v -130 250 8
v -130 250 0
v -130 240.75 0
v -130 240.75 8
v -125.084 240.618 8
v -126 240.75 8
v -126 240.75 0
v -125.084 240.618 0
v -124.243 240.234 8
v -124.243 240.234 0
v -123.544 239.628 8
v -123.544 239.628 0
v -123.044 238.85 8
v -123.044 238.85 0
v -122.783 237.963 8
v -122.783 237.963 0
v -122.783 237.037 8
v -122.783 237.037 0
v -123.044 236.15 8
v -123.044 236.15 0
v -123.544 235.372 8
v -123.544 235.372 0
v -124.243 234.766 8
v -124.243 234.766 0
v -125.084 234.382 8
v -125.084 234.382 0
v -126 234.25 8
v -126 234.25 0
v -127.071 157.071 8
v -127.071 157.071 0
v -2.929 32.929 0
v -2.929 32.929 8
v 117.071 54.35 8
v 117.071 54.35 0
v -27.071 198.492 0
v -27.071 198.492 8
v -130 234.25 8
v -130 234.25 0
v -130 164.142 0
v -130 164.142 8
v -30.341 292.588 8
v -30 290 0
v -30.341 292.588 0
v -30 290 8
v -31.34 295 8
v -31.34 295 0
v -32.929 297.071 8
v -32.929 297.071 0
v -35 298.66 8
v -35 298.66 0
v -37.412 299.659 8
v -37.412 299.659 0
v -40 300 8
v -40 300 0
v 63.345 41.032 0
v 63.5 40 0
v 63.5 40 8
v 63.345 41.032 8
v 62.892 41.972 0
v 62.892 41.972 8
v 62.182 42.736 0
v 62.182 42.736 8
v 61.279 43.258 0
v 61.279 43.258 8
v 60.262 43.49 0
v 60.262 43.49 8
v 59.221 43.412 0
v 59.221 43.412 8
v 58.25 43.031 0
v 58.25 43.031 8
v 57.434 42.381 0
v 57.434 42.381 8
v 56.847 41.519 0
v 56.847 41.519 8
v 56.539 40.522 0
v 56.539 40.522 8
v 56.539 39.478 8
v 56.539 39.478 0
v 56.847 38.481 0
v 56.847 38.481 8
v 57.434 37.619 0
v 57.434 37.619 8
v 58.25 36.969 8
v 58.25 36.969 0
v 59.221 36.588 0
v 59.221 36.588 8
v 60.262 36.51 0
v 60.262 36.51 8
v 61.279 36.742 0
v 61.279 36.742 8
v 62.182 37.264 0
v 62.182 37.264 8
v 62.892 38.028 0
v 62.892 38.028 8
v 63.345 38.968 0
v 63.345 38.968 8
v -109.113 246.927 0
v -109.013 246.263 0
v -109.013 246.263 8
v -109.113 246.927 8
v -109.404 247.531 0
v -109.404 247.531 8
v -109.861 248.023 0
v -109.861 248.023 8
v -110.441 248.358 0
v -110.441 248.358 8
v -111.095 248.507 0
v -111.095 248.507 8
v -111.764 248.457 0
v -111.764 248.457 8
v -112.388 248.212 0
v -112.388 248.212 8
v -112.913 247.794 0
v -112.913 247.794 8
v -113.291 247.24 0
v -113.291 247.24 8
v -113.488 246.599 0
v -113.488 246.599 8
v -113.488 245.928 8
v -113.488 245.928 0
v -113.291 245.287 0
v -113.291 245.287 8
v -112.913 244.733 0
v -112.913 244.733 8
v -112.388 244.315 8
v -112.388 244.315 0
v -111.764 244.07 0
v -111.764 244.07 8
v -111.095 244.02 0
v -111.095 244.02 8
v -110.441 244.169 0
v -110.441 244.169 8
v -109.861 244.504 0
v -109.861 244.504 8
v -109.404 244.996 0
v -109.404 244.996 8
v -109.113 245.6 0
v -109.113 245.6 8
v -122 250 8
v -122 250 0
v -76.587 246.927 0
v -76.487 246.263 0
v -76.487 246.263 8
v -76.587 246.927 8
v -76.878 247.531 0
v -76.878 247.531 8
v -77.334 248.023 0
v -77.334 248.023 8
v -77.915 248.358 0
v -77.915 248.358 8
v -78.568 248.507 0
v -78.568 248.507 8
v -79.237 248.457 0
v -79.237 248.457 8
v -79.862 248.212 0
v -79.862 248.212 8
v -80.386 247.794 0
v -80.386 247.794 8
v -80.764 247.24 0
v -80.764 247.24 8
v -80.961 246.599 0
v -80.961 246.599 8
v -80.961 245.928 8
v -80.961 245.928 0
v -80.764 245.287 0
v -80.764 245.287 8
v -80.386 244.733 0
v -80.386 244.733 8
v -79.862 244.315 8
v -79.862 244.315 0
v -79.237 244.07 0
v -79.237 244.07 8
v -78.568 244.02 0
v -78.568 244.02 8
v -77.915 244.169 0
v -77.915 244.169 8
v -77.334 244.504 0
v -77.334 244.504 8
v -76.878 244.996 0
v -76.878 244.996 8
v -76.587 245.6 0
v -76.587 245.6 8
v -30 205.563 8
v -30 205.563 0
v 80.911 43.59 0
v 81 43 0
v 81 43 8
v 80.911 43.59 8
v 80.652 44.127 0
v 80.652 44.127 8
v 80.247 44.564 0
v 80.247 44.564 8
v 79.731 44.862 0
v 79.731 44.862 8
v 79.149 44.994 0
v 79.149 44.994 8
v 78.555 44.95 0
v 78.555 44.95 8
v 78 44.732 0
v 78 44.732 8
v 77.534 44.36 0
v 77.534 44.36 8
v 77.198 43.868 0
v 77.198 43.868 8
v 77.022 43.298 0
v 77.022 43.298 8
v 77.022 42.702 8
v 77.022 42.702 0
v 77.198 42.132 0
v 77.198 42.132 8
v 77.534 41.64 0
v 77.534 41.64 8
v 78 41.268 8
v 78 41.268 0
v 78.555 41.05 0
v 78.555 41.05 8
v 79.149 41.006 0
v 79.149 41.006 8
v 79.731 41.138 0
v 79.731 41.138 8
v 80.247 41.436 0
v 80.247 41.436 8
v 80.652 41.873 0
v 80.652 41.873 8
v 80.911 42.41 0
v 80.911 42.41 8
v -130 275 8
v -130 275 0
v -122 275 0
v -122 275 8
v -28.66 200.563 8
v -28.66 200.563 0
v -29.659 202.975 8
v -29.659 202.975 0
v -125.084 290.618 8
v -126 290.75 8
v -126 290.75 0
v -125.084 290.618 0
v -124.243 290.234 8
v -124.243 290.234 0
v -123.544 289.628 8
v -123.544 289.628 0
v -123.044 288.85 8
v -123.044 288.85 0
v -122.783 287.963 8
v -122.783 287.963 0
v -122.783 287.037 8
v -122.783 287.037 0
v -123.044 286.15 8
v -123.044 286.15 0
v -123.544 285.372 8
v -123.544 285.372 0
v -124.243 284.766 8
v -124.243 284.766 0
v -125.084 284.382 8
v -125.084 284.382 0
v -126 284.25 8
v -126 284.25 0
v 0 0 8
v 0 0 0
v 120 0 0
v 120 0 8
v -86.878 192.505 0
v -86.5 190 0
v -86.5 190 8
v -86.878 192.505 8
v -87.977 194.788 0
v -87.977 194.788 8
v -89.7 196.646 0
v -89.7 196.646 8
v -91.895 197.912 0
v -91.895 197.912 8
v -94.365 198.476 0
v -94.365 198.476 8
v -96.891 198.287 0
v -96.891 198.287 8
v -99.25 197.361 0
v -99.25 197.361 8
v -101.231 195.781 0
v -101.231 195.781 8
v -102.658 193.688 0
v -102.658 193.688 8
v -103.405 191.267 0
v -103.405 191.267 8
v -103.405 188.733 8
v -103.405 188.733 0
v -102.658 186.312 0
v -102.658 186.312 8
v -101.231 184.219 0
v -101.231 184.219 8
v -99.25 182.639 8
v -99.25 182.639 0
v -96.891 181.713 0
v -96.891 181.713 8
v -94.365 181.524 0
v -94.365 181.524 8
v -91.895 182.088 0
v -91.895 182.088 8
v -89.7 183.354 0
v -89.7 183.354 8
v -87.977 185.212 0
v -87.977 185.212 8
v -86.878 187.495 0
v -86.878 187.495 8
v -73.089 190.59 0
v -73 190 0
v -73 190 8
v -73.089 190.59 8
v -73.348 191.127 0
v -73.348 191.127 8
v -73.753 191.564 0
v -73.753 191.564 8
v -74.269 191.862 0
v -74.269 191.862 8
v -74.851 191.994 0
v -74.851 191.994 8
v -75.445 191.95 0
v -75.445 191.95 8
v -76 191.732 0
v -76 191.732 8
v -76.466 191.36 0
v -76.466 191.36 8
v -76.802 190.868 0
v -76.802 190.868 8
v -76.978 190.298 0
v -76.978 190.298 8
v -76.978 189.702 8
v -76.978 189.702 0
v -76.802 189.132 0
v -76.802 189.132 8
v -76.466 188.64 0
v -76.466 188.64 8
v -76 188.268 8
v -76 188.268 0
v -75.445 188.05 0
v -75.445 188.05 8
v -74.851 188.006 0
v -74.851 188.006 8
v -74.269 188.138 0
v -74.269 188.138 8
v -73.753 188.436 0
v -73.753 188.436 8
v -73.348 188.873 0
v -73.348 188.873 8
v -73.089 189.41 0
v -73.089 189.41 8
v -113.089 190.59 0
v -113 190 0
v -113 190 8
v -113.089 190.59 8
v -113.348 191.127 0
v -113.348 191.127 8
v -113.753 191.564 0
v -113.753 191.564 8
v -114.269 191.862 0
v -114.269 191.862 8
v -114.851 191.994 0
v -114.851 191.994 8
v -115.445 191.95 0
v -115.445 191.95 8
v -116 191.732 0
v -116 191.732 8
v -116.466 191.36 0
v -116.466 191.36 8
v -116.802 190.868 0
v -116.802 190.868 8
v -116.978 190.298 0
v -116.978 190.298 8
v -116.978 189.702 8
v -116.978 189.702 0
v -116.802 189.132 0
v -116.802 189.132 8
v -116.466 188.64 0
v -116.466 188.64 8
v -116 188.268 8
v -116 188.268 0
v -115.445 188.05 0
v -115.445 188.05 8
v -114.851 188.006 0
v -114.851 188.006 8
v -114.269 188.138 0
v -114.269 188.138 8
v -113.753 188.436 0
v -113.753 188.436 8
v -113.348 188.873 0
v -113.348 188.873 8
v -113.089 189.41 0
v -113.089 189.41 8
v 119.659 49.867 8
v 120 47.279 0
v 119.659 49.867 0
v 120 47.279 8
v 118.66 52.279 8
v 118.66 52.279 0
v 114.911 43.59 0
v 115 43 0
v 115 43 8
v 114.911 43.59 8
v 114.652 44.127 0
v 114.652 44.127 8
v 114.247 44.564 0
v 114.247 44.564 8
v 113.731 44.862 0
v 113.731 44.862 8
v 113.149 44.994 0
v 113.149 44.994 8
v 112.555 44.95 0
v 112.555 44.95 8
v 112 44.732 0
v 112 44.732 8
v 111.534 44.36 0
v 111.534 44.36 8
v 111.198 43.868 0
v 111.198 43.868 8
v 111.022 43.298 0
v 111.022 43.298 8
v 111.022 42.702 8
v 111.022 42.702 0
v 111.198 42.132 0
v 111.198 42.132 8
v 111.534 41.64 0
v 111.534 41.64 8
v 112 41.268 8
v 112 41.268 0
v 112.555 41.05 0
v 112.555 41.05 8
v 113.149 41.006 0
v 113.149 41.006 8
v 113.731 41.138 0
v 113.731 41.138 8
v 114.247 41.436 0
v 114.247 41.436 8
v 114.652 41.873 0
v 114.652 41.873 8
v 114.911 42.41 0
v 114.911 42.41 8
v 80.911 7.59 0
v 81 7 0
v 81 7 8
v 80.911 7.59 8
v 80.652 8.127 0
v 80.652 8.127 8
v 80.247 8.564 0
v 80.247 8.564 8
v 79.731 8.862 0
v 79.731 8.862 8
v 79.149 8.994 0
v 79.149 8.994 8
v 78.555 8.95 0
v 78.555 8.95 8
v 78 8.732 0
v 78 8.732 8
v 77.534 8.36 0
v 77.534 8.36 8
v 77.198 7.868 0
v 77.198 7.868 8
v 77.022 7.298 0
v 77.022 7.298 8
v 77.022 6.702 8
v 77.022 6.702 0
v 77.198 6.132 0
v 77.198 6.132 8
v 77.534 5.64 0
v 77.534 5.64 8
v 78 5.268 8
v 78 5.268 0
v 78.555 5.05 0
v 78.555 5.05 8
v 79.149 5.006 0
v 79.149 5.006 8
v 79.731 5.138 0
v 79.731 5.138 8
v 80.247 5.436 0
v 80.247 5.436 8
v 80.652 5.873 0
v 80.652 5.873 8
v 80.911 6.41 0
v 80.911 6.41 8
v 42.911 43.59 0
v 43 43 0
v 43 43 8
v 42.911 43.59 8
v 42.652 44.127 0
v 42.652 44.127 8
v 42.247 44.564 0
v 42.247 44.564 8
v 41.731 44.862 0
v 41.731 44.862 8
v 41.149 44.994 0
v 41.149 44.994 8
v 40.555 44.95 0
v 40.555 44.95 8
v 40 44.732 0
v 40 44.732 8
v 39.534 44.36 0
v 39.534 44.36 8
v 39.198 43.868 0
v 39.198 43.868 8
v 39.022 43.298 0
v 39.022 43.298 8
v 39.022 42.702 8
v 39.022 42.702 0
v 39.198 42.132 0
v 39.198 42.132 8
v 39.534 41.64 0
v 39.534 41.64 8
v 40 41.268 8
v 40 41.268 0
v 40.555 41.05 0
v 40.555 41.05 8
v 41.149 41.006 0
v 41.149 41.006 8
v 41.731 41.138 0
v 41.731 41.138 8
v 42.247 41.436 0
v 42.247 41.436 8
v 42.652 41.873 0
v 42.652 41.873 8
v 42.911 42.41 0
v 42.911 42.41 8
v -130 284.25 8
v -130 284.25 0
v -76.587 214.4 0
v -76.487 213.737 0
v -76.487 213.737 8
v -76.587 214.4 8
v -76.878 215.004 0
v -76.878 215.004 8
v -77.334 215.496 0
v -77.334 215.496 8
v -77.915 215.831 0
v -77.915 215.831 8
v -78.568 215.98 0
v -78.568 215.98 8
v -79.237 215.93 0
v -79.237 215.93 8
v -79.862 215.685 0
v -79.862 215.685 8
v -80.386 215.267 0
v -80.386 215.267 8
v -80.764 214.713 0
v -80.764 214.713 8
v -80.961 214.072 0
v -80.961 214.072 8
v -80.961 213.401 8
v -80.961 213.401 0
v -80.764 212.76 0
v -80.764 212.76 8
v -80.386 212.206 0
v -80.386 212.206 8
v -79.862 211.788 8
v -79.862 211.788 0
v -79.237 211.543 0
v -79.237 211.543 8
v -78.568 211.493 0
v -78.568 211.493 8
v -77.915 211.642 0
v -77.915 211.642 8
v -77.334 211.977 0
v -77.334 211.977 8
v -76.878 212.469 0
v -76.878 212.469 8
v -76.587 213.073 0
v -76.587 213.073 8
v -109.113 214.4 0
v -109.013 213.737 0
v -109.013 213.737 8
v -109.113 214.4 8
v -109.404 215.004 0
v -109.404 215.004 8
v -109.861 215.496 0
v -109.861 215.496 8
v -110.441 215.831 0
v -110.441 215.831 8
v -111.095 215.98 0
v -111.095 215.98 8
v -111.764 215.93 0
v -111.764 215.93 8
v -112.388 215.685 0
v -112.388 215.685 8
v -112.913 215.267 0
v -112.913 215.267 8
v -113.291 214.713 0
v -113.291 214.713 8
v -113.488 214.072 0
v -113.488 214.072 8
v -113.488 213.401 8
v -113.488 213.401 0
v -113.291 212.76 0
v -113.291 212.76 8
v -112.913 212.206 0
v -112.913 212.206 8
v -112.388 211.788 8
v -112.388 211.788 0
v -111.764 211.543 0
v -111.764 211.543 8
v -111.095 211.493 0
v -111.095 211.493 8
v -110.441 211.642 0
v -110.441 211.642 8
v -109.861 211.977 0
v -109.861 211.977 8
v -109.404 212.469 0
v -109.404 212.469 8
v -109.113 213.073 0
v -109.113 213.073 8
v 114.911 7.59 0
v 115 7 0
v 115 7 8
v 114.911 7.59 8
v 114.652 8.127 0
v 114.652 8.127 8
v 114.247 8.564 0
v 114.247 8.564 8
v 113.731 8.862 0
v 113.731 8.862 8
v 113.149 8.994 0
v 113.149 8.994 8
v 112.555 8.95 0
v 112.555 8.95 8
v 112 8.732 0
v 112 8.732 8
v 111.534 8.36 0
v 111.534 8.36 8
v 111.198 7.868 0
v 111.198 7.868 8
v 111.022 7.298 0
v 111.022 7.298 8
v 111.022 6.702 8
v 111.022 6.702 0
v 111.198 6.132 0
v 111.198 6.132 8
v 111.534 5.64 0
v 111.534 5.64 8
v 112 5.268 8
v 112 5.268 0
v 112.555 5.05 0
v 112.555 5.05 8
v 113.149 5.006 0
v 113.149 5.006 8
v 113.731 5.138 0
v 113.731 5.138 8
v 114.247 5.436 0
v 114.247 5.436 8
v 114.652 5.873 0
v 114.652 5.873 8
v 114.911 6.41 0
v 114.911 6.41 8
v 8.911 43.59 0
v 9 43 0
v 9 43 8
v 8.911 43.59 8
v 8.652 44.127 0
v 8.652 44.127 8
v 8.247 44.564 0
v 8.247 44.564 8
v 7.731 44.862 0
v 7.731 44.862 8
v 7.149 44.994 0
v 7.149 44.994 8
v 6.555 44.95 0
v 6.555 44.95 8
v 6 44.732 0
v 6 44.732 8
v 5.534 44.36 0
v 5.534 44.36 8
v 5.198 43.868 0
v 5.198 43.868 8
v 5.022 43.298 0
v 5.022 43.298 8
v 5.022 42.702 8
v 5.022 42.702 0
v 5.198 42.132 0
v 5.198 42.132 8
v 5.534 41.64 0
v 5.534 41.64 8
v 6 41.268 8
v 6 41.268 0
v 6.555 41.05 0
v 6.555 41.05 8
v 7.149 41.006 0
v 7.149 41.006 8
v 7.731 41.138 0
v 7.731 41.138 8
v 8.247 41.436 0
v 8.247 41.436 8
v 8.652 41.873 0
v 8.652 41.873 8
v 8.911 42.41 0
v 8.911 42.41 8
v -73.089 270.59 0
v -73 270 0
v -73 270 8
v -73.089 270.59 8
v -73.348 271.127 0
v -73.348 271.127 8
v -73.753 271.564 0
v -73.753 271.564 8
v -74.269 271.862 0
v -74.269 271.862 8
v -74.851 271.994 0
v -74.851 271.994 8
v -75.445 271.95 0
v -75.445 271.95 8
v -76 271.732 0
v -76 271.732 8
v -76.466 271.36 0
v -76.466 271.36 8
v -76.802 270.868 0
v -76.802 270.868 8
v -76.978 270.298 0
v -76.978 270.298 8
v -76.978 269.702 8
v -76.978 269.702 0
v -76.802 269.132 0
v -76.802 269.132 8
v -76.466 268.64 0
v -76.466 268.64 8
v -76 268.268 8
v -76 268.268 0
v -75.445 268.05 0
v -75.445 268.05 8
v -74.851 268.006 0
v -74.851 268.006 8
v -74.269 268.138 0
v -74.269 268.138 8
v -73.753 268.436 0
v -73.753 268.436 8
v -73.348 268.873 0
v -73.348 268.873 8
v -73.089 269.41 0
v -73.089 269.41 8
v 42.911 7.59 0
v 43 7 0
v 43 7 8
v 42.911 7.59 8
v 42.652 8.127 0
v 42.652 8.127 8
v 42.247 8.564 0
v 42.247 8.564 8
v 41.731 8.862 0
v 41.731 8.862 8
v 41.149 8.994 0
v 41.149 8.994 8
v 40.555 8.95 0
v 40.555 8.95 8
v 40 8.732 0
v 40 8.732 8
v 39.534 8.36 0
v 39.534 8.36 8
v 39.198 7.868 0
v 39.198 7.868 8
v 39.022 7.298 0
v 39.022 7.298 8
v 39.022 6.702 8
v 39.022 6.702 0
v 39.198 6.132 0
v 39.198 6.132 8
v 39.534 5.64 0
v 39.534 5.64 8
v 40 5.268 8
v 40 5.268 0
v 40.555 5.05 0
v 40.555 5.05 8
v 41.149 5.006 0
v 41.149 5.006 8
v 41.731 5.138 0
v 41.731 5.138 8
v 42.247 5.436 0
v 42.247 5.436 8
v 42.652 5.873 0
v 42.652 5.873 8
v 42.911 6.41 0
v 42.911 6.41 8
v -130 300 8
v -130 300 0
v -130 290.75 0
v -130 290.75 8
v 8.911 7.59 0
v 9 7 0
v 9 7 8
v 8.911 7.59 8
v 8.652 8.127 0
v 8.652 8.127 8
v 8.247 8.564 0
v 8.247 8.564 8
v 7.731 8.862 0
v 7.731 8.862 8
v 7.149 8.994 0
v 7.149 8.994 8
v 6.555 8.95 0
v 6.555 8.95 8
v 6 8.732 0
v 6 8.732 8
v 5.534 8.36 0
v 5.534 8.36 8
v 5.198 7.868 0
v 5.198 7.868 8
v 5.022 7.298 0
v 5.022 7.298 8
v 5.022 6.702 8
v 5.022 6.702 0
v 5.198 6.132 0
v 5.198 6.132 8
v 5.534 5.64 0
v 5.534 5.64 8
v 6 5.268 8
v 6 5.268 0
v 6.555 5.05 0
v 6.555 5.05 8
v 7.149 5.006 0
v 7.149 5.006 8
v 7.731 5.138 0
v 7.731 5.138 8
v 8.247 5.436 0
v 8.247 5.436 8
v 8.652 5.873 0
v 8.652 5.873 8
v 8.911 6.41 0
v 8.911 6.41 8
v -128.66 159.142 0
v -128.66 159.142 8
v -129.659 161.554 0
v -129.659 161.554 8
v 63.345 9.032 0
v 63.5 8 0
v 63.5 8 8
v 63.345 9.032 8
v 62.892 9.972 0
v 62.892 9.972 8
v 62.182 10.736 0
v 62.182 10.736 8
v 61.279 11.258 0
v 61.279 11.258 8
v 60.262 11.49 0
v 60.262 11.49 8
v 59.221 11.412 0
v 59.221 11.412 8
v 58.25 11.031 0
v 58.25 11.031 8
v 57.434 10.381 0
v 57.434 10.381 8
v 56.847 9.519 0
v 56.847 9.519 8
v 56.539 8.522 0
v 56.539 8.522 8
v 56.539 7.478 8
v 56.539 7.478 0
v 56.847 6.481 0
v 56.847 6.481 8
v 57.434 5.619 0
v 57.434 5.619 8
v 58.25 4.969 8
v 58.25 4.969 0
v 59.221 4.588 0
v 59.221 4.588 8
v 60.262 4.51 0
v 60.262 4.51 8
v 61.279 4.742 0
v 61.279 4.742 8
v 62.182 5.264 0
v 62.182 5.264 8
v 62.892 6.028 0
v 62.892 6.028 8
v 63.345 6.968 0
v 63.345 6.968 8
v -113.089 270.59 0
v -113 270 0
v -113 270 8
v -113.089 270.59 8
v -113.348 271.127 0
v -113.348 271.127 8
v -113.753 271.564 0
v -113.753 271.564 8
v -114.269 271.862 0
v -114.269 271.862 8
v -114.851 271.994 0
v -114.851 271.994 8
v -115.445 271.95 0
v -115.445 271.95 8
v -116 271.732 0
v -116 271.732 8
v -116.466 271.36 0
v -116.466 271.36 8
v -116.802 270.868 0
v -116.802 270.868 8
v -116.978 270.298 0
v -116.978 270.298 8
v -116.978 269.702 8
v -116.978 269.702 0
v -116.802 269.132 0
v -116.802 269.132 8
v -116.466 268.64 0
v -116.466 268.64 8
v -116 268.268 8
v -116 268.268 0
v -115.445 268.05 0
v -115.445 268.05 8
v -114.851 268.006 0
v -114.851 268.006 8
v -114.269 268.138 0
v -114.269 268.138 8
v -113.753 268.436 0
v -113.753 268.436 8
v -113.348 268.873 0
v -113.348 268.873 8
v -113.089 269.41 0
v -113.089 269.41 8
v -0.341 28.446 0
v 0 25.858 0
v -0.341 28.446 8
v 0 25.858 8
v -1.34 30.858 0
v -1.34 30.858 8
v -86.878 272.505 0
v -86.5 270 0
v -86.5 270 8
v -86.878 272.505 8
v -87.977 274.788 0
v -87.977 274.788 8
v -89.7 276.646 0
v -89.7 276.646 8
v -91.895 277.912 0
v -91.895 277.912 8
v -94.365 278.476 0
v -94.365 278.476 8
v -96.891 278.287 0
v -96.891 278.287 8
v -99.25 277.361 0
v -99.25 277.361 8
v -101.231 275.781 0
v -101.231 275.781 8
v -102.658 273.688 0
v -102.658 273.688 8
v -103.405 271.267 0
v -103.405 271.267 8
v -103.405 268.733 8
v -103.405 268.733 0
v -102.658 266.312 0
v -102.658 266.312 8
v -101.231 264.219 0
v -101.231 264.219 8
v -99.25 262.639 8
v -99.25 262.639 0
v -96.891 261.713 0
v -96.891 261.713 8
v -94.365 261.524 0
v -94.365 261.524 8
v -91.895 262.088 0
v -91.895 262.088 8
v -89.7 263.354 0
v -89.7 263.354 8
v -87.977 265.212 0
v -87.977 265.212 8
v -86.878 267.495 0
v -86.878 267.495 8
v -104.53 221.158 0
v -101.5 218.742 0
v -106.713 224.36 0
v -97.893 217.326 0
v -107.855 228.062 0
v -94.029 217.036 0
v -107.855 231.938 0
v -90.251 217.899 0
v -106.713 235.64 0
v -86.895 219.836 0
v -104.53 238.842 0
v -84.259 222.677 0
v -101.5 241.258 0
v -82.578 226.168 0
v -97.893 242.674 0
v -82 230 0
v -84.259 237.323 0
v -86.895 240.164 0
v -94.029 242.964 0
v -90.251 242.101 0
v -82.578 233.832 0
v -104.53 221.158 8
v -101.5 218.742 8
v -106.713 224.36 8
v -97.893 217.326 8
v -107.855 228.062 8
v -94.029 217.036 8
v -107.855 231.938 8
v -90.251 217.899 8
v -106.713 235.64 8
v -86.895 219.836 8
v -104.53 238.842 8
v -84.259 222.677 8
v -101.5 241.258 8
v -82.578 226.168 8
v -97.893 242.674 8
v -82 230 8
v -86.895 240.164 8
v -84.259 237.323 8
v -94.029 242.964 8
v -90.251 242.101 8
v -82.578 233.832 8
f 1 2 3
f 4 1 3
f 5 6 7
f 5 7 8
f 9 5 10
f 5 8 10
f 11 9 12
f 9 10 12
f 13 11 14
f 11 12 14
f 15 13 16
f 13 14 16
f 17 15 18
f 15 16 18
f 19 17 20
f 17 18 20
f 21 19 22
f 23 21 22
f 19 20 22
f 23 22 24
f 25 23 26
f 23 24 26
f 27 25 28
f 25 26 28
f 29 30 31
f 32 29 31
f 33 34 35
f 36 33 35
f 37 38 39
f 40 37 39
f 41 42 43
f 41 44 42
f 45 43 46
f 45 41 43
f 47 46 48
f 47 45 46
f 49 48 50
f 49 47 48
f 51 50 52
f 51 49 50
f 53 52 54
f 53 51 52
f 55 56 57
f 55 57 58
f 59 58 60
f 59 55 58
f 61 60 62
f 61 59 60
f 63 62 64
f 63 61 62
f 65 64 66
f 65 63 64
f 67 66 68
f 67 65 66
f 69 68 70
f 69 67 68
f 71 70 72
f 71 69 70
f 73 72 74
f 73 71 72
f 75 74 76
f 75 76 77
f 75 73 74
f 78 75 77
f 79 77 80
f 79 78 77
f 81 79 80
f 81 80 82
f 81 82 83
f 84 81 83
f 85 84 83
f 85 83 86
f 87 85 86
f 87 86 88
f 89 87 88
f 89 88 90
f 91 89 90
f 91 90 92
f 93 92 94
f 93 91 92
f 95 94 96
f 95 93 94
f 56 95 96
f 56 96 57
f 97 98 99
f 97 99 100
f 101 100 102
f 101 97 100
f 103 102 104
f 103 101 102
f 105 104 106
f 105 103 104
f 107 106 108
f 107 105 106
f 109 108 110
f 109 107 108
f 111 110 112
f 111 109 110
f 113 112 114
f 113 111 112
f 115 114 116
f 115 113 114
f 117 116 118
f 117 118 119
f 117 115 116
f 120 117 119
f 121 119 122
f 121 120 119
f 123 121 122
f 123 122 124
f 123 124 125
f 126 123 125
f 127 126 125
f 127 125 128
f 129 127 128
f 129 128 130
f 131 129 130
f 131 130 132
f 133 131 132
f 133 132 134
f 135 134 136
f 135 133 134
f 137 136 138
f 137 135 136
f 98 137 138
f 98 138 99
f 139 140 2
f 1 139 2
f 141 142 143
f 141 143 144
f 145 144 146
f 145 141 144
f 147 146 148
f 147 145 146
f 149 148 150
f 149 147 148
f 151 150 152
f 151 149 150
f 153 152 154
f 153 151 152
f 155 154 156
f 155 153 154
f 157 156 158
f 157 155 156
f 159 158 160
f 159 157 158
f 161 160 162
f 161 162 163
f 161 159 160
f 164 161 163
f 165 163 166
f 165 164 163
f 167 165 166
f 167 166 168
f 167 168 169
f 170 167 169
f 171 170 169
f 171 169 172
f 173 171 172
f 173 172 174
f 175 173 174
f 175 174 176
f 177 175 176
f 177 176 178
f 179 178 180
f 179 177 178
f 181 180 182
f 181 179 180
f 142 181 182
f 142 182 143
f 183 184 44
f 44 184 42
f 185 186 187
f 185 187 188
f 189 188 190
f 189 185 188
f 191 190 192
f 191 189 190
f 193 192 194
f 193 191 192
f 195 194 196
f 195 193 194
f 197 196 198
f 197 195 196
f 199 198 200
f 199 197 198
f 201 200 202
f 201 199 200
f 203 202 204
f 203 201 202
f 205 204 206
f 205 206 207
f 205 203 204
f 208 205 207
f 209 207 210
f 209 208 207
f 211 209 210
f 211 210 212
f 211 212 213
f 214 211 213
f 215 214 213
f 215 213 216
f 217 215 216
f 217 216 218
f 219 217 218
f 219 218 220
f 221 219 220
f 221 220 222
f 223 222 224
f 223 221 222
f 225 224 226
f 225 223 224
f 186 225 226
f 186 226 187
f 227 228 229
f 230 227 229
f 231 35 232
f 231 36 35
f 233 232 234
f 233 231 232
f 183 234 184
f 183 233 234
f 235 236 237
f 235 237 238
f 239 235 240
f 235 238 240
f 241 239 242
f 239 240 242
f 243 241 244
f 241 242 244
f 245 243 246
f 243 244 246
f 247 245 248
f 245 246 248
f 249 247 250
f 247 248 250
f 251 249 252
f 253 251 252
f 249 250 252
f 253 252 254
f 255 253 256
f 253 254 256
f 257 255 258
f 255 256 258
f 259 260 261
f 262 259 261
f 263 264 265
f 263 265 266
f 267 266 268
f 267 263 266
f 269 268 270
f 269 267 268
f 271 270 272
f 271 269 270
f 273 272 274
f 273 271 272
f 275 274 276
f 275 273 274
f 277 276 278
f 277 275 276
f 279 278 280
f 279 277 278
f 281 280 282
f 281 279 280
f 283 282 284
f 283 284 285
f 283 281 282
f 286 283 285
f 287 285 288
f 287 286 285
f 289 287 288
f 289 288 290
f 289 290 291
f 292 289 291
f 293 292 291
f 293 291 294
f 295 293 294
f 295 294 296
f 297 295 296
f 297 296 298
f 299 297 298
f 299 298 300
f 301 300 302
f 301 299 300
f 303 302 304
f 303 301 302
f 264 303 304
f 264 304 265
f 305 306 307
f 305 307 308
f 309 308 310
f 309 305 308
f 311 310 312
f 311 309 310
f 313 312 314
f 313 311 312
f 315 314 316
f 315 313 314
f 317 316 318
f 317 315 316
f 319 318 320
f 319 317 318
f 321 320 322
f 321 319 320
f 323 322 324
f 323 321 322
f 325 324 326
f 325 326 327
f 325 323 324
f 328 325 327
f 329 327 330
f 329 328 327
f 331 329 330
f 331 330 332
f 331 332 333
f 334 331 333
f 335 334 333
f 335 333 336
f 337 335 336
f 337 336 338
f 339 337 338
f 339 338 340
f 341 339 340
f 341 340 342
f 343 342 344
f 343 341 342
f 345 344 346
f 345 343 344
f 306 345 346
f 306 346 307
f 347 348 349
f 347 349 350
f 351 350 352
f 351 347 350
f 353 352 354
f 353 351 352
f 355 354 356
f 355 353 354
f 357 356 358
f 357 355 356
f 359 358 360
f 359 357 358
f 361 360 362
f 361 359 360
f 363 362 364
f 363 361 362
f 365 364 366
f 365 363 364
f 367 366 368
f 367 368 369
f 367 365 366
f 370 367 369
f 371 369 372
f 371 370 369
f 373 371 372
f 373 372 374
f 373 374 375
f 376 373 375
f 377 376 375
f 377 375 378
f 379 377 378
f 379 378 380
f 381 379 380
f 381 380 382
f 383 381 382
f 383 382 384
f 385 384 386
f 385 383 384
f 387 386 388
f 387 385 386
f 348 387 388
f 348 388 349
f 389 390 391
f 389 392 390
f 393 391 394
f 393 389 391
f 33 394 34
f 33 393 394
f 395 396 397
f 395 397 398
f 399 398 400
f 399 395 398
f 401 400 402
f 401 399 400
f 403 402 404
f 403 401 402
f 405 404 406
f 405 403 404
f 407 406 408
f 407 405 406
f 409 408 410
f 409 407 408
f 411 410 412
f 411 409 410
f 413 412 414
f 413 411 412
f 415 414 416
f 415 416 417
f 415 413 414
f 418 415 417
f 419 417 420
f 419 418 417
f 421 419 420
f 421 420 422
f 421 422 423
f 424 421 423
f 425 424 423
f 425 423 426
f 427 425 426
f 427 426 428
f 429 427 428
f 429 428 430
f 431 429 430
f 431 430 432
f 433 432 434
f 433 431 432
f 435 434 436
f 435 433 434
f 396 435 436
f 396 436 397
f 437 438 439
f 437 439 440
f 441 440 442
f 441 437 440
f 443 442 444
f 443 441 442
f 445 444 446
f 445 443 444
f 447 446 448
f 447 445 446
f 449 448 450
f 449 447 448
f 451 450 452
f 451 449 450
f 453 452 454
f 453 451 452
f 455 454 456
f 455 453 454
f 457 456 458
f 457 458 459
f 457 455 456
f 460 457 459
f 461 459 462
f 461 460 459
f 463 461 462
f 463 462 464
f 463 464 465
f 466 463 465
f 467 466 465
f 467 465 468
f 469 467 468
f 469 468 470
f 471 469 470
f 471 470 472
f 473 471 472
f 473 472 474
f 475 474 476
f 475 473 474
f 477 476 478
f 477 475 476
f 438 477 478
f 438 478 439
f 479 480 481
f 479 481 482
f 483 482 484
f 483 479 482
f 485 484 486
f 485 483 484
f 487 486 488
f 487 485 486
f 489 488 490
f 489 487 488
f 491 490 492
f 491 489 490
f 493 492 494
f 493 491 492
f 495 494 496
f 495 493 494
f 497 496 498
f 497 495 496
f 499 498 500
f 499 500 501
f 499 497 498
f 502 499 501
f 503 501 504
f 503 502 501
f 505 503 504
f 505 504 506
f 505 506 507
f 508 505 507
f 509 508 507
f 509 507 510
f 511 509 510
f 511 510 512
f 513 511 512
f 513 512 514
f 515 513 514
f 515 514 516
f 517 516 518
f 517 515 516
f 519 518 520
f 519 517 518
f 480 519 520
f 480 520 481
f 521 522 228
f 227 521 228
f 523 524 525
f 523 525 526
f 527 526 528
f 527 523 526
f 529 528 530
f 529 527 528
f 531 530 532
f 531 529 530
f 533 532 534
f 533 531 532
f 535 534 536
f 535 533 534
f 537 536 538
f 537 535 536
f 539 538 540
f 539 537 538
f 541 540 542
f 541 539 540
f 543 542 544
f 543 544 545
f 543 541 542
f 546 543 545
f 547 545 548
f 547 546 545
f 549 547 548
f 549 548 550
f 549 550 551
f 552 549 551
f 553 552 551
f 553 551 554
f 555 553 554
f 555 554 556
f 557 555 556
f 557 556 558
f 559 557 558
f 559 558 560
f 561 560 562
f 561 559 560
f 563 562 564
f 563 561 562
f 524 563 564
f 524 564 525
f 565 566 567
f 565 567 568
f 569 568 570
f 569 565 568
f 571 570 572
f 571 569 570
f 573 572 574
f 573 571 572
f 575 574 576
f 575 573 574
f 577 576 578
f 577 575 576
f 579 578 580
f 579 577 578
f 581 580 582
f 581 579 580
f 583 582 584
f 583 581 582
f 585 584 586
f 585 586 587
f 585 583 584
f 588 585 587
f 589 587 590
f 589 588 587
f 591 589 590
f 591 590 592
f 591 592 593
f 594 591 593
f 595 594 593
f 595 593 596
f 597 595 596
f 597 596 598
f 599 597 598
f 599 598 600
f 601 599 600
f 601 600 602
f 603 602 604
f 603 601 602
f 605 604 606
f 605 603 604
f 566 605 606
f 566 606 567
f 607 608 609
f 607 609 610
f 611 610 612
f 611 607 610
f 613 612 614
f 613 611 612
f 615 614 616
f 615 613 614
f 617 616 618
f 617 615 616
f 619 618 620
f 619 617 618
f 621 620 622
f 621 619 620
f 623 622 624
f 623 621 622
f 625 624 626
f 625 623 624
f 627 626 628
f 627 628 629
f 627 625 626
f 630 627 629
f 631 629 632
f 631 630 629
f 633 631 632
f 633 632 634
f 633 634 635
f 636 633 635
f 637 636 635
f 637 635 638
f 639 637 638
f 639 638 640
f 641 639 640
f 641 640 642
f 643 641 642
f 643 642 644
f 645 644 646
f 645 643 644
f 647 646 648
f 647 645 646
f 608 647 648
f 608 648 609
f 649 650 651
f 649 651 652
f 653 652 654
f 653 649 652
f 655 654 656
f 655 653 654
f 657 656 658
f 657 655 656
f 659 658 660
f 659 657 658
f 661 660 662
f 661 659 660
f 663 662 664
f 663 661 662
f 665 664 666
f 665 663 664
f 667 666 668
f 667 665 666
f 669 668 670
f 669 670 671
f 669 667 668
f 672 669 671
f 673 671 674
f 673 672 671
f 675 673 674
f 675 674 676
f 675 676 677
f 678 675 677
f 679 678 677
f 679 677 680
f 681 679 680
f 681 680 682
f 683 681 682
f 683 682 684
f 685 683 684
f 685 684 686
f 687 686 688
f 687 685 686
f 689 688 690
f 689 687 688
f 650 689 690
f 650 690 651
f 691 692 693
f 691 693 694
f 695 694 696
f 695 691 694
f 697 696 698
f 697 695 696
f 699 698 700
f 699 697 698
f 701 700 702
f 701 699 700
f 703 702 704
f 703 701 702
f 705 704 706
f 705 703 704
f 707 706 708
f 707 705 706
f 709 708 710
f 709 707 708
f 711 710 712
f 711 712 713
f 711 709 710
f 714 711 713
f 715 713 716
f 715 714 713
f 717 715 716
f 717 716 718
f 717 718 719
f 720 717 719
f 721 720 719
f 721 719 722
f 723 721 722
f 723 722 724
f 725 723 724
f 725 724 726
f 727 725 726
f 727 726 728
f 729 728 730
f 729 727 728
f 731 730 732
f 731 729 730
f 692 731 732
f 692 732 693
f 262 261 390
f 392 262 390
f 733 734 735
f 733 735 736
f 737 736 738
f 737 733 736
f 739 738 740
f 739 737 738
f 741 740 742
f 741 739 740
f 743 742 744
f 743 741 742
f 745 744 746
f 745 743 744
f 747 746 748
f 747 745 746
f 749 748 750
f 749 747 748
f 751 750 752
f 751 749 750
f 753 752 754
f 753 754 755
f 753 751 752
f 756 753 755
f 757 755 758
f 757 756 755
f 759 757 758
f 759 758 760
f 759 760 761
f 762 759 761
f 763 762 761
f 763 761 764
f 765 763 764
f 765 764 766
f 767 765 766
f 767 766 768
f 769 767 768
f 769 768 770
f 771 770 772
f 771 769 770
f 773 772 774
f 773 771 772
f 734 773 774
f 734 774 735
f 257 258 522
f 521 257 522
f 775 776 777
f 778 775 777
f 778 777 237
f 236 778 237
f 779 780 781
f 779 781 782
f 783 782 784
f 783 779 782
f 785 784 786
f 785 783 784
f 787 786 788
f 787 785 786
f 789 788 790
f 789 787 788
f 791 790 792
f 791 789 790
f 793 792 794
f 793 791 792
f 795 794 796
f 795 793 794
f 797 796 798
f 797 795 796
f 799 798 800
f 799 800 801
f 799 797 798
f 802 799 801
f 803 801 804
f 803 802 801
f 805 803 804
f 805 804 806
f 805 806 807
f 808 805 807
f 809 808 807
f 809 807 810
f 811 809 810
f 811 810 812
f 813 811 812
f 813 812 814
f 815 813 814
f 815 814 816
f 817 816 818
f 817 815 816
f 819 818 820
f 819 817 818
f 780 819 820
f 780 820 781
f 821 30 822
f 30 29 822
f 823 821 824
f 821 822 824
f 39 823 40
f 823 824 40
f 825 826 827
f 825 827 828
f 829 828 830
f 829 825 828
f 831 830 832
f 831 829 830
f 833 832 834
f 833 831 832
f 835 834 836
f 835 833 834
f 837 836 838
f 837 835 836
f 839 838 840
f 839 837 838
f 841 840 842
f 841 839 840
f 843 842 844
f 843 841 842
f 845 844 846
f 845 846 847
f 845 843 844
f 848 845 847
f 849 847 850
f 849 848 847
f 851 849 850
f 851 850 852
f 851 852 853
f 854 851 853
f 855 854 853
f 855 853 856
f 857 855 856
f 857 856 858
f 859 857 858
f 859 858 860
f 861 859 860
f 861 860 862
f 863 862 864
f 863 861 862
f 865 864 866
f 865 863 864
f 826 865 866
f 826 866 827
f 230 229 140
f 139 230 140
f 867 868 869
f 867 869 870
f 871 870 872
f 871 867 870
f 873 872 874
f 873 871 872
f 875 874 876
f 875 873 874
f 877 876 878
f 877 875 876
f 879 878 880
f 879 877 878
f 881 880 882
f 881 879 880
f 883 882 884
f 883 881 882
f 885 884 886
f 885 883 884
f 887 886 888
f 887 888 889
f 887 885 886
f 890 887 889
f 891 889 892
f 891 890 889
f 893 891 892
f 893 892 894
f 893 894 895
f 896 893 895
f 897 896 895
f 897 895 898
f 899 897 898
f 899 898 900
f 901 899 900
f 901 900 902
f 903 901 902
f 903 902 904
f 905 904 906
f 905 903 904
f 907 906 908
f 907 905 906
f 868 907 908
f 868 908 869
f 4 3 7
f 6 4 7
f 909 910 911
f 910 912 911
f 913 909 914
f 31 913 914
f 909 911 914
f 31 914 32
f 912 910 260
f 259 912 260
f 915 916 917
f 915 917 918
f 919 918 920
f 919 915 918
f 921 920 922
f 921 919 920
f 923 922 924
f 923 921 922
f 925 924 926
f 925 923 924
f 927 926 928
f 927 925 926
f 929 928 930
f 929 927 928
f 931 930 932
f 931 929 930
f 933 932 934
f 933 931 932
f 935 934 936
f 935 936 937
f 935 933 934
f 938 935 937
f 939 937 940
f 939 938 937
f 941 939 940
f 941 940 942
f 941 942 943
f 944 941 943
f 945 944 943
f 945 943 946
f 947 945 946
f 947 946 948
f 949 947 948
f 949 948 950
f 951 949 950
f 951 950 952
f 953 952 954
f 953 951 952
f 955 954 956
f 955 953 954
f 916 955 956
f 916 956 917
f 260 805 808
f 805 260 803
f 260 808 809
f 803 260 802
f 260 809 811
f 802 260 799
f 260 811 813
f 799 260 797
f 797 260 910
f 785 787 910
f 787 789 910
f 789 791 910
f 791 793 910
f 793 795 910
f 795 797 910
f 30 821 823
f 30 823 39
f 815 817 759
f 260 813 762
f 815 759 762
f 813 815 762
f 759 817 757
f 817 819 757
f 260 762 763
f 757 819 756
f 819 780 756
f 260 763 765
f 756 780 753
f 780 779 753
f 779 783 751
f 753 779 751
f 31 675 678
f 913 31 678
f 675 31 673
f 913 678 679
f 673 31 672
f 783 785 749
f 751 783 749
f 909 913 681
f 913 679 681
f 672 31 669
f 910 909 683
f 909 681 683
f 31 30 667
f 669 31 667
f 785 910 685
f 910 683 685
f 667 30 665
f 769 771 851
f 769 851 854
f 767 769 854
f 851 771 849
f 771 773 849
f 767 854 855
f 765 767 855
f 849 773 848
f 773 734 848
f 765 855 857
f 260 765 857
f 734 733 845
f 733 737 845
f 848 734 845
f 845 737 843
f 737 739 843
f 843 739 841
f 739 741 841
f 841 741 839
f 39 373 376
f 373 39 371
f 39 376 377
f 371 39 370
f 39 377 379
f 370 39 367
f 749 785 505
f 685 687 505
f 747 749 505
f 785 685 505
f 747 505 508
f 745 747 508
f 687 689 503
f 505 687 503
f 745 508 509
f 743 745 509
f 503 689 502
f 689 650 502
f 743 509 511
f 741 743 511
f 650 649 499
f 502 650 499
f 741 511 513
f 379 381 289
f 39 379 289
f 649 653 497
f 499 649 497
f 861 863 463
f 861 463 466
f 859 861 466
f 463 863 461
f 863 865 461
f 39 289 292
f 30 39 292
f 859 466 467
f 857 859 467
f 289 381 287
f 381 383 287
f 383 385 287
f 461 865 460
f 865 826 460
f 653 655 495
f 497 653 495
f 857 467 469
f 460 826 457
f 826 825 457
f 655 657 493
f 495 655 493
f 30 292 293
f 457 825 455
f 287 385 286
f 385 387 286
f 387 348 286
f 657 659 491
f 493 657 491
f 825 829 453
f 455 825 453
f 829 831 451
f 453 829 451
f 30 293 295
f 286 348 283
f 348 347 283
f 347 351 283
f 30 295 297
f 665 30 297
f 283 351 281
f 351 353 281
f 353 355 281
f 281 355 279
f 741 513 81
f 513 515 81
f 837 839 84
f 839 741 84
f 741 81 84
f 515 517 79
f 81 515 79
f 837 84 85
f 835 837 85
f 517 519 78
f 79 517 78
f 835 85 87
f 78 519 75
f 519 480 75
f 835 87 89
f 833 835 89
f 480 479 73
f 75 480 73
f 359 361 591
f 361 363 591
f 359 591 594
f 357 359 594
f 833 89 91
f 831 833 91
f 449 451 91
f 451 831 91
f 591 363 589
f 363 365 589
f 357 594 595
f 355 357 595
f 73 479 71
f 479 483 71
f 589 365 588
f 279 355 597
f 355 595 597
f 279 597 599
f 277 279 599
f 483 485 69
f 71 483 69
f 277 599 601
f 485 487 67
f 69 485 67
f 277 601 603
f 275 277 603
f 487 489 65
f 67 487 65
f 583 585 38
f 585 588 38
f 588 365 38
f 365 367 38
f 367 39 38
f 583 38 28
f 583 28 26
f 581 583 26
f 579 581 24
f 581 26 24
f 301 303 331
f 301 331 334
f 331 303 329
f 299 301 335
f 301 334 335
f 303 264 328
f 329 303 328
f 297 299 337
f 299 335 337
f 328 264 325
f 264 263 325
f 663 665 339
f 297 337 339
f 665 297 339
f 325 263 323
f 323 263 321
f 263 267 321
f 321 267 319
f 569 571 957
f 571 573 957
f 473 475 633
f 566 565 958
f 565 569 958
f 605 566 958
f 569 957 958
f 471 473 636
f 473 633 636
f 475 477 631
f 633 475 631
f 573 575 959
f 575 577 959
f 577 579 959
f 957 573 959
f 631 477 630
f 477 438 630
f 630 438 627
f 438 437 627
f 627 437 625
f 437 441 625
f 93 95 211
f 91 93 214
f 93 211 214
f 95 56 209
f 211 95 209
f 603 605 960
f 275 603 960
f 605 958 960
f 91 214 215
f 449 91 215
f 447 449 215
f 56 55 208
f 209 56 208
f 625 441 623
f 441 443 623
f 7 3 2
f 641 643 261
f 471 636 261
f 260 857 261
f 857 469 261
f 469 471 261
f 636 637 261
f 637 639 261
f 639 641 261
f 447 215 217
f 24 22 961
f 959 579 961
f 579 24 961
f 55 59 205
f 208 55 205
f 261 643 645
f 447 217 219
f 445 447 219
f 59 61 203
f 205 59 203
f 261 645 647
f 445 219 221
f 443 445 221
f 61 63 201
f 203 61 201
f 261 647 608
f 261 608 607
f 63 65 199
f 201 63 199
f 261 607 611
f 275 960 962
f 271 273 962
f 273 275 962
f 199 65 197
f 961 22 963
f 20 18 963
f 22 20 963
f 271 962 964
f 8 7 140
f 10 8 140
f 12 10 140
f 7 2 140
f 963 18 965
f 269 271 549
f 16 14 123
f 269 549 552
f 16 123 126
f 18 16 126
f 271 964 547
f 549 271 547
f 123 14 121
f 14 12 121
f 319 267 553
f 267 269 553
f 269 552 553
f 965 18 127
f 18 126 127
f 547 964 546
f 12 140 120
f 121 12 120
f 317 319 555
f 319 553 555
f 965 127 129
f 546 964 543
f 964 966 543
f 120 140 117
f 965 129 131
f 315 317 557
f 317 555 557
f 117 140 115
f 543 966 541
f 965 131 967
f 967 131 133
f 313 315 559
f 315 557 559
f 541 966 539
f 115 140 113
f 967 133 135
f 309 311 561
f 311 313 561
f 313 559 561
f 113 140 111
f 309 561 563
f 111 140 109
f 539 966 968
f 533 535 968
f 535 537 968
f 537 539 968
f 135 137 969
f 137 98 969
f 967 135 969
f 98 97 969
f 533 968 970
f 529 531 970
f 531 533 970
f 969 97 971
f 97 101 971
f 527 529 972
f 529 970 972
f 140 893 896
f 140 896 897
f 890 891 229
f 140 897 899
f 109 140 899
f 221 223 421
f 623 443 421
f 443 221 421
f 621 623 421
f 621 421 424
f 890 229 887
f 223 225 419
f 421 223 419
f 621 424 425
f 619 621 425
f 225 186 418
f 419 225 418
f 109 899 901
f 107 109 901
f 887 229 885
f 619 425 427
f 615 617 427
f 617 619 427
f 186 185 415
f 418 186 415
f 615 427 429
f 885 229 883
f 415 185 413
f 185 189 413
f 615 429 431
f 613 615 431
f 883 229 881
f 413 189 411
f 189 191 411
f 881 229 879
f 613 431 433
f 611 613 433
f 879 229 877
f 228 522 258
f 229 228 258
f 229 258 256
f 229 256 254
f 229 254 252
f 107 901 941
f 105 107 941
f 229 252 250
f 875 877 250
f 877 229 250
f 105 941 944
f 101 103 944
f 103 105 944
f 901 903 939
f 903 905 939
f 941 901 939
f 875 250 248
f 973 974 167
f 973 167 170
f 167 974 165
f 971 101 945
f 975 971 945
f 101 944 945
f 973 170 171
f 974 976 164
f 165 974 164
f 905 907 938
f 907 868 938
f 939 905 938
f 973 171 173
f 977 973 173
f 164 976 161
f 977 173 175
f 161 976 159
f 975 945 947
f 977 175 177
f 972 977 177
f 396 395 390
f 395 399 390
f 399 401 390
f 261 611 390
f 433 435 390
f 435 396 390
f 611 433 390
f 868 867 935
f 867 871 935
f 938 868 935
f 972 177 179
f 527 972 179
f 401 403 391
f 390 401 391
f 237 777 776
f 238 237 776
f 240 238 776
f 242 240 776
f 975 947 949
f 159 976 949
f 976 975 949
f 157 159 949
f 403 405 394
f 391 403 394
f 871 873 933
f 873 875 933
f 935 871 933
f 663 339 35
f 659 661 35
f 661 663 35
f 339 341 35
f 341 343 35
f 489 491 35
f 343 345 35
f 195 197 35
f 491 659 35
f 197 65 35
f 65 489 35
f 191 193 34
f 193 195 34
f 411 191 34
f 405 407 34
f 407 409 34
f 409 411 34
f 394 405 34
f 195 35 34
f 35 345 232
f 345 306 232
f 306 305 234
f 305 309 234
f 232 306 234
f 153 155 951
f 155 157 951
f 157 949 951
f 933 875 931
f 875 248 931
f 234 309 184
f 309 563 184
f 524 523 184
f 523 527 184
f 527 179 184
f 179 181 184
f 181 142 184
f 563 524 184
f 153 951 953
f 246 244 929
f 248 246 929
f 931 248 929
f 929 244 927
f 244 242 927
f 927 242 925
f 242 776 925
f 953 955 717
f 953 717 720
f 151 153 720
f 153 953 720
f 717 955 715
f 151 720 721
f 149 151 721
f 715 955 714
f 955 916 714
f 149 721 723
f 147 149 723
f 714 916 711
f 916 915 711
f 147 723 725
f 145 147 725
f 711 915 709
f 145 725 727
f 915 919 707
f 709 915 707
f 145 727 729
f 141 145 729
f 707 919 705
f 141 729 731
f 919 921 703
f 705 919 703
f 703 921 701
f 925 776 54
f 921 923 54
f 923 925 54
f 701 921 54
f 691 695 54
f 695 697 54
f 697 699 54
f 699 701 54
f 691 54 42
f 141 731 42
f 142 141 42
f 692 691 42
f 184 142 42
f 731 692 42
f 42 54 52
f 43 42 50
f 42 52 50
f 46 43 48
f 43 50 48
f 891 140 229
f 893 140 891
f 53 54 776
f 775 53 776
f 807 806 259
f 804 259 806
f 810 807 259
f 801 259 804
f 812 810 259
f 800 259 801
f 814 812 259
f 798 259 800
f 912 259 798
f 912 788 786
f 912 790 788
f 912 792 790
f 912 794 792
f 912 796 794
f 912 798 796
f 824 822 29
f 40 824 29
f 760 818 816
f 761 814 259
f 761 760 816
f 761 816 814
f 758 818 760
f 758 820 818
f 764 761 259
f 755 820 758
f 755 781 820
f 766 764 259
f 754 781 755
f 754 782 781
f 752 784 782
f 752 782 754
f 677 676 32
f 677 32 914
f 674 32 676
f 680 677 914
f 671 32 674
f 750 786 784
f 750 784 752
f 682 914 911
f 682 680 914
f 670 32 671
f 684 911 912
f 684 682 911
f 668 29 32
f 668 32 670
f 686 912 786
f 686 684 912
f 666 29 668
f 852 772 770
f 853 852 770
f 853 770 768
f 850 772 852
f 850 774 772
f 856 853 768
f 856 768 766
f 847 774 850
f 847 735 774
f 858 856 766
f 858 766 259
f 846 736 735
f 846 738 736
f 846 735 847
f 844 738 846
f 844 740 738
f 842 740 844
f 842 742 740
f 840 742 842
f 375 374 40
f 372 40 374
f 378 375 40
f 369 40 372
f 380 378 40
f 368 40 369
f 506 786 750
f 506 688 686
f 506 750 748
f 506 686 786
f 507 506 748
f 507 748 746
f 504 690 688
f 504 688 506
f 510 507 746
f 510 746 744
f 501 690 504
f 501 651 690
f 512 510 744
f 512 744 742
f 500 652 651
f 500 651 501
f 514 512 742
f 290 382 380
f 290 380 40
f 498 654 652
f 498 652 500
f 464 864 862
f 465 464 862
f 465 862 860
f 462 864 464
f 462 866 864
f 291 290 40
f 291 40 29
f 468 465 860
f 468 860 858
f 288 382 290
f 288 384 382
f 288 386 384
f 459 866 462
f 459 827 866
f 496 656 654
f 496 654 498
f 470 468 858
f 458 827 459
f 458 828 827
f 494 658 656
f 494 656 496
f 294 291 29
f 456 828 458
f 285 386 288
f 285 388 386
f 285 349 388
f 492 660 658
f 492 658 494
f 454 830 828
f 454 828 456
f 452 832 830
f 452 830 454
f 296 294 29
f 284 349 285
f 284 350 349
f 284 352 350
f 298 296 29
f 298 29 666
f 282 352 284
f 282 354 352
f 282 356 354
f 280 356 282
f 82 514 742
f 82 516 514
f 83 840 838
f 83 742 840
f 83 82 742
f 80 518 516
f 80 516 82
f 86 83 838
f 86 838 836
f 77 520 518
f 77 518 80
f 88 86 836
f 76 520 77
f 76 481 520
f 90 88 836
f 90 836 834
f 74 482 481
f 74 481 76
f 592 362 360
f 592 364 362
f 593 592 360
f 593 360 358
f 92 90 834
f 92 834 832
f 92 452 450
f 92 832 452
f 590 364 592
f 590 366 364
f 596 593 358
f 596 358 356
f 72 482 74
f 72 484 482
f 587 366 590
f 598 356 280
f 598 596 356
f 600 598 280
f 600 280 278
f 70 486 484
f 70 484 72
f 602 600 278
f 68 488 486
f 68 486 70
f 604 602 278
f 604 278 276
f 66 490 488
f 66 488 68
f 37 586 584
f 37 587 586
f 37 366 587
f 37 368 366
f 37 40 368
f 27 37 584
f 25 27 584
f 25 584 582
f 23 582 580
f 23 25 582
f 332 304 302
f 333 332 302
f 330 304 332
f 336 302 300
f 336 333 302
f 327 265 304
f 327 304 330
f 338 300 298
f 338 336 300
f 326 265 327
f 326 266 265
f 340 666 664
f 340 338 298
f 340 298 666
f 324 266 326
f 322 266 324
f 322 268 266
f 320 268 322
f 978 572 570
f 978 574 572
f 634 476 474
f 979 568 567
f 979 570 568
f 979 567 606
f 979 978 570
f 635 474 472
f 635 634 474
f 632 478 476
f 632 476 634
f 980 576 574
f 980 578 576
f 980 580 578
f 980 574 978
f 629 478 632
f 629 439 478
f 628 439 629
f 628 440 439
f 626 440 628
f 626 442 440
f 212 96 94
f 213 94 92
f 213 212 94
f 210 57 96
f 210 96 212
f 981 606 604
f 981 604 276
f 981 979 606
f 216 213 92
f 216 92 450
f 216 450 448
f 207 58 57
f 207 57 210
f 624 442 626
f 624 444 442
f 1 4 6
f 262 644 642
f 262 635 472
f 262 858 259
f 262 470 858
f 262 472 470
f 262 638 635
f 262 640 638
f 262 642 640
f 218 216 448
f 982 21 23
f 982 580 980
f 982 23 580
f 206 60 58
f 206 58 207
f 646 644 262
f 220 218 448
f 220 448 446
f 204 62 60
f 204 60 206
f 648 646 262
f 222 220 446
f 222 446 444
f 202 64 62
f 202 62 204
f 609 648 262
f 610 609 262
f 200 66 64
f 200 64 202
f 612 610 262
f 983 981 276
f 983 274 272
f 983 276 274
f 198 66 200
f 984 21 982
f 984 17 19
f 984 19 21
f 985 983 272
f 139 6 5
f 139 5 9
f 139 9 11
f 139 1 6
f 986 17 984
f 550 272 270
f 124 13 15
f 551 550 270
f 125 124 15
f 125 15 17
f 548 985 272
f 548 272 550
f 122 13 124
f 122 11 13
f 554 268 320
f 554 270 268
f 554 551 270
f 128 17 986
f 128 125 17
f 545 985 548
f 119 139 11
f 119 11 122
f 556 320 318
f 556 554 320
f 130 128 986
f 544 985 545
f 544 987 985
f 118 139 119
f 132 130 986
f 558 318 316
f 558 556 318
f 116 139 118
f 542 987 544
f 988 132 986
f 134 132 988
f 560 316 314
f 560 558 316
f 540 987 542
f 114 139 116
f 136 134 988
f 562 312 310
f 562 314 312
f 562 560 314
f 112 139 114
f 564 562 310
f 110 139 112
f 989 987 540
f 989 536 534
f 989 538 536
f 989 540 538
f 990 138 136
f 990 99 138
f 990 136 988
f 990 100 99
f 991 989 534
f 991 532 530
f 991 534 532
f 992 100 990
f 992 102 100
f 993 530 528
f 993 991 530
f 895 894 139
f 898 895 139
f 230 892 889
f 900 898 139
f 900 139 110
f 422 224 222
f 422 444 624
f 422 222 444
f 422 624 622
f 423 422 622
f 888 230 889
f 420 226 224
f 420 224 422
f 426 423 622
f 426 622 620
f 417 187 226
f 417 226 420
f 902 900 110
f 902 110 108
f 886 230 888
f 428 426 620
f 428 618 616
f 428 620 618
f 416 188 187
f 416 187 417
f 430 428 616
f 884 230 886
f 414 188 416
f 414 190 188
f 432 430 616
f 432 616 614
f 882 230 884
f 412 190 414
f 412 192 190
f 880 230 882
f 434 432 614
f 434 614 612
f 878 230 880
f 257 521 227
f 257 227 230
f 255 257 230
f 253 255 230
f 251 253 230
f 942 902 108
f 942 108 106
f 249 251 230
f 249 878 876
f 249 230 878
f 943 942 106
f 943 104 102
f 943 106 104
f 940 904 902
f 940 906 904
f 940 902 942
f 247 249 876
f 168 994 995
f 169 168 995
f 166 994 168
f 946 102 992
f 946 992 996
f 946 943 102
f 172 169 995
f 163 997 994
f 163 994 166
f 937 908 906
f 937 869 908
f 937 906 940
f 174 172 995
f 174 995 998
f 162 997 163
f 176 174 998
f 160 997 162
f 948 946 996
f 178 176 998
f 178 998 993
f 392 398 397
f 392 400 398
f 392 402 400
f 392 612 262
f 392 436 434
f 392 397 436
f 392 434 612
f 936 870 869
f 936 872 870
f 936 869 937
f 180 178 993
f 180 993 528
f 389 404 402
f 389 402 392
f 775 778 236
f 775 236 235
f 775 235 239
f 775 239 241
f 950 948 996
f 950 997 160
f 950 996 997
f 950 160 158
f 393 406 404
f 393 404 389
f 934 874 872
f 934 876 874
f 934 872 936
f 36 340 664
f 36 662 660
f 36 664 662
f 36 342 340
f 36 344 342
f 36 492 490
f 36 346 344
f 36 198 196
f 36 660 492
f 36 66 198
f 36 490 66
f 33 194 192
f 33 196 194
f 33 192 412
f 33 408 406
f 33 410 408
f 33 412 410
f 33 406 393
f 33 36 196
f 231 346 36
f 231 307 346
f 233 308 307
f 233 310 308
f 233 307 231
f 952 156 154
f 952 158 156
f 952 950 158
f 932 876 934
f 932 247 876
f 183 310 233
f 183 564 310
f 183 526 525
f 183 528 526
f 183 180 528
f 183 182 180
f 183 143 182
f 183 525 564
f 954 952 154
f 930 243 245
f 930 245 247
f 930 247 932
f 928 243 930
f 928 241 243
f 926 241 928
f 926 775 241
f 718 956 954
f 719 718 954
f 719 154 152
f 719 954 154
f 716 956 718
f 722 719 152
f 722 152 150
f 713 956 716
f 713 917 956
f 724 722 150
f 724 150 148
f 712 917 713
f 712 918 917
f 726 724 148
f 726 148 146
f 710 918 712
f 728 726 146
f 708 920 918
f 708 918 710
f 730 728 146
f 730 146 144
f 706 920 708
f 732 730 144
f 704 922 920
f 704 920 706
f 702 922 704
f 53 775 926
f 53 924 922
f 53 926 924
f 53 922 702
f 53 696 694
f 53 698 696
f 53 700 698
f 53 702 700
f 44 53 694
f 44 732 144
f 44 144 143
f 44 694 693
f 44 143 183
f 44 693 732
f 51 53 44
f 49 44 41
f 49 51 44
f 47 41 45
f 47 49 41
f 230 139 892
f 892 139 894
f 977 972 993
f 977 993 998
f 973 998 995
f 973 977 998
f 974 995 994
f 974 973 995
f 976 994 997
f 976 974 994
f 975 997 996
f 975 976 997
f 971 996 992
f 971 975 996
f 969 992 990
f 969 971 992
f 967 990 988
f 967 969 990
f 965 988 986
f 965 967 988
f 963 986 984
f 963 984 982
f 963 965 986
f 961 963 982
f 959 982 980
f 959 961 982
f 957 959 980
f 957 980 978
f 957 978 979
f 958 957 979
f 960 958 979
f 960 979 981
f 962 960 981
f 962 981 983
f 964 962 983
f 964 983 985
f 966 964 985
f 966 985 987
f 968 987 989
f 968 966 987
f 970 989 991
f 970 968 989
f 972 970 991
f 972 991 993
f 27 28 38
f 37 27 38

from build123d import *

# Parameters (mm, degrees)
F0_R     = 2
F0_R_2   = 3.5
F0_R_3   = 2.25
F0_R_4   = 8.5
F0_R_5   = 13
F1_DEPTH = 8
F2_R     = 10


with BuildPart() as f1:
    # F0 (on Top) → F1 (new body)
    with BuildSketch(Plane.XY):
        with BuildLine():
            Line((0, 30), (0, 0))
            Line((0, 0), (120, 0))
            Line((120, 0), (120, 51.421356))
            Line((120, 51.421356), (-30, 201.421356))
            Line((-30, 201.421356), (-30, 300))
            Line((-30, 300), (-130, 300))
            Line((-130, 300), (-130, 290.75))
            Line((-130, 290.75), (-126, 290.75))
            ThreePointArc((-126, 290.75), (-122.75, 287.5), (-126, 284.25))
            Line((-126, 284.25), (-130, 284.25))
            Line((-130, 284.25), (-130, 275))
            Line((-130, 275), (-122, 275))
            Line((-122, 275), (-122, 250))
            Line((-122, 250), (-130, 250))
            Line((-130, 250), (-130, 240.75))
            Line((-130, 240.75), (-126, 240.75))
            ThreePointArc((-126, 240.75), (-122.75, 237.5), (-126, 234.25))
            Line((-126, 234.25), (-130, 234.25))
            Line((-130, 234.25), (-130, 160))
            Line((-130, 160), (0, 30))
        make_face()
        with Locations((7, 7)):
            Circle(F0_R, mode=Mode.SUBTRACT)
        with Locations((41, 7)):
            Circle(F0_R, mode=Mode.SUBTRACT)
        with Locations((7, 43)):
            Circle(F0_R, mode=Mode.SUBTRACT)
        with Locations((41, 43)):
            Circle(F0_R, mode=Mode.SUBTRACT)
        with Locations((60, 8)):
            Circle(F0_R_2, mode=Mode.SUBTRACT)
        with Locations((79, 7)):
            Circle(F0_R, mode=Mode.SUBTRACT)
        with Locations((113, 7)):
            Circle(F0_R, mode=Mode.SUBTRACT)
        with Locations((60, 40)):
            Circle(F0_R_2, mode=Mode.SUBTRACT)
        with Locations((79, 43)):
            Circle(F0_R, mode=Mode.SUBTRACT)
        with Locations((113, 43)):
            Circle(F0_R, mode=Mode.SUBTRACT)
        with Locations((-115, 190)):
            Circle(F0_R, mode=Mode.SUBTRACT)
        with Locations((-111.263456, 213.736544)):
            Circle(F0_R_3, mode=Mode.SUBTRACT)
        with Locations((-95, 190)):
            Circle(F0_R_4, mode=Mode.SUBTRACT)
        with Locations((-75, 190)):
            Circle(F0_R, mode=Mode.SUBTRACT)
        with Locations((-78.736544, 213.736544)):
            Circle(F0_R_3, mode=Mode.SUBTRACT)
        with Locations((-111.263456, 246.263456)):
            Circle(F0_R_3, mode=Mode.SUBTRACT)
        with Locations((-95, 230)):
            Circle(F0_R_5, mode=Mode.SUBTRACT)
        with Locations((-78.736544, 246.263456)):
            Circle(F0_R_3, mode=Mode.SUBTRACT)
        with Locations((-115, 270)):
            Circle(F0_R, mode=Mode.SUBTRACT)
        with Locations((-95, 270)):
            Circle(F0_R_4, mode=Mode.SUBTRACT)
        with Locations((-75, 270)):
            Circle(F0_R, mode=Mode.SUBTRACT)
    extrude(amount=F1_DEPTH)

    # F2
    f2_edges = [f1.edges().sort_by_distance(p)[0] for p in [
        (-30, 300, 4),
        (-30, 201.421356, 4),
        (-130, 160, 4),
        (0, 30, 4),
        (120, 51.421356, 4),
    ]]
    fillet(f2_edges, radius=F2_R)


solid = f1.part
